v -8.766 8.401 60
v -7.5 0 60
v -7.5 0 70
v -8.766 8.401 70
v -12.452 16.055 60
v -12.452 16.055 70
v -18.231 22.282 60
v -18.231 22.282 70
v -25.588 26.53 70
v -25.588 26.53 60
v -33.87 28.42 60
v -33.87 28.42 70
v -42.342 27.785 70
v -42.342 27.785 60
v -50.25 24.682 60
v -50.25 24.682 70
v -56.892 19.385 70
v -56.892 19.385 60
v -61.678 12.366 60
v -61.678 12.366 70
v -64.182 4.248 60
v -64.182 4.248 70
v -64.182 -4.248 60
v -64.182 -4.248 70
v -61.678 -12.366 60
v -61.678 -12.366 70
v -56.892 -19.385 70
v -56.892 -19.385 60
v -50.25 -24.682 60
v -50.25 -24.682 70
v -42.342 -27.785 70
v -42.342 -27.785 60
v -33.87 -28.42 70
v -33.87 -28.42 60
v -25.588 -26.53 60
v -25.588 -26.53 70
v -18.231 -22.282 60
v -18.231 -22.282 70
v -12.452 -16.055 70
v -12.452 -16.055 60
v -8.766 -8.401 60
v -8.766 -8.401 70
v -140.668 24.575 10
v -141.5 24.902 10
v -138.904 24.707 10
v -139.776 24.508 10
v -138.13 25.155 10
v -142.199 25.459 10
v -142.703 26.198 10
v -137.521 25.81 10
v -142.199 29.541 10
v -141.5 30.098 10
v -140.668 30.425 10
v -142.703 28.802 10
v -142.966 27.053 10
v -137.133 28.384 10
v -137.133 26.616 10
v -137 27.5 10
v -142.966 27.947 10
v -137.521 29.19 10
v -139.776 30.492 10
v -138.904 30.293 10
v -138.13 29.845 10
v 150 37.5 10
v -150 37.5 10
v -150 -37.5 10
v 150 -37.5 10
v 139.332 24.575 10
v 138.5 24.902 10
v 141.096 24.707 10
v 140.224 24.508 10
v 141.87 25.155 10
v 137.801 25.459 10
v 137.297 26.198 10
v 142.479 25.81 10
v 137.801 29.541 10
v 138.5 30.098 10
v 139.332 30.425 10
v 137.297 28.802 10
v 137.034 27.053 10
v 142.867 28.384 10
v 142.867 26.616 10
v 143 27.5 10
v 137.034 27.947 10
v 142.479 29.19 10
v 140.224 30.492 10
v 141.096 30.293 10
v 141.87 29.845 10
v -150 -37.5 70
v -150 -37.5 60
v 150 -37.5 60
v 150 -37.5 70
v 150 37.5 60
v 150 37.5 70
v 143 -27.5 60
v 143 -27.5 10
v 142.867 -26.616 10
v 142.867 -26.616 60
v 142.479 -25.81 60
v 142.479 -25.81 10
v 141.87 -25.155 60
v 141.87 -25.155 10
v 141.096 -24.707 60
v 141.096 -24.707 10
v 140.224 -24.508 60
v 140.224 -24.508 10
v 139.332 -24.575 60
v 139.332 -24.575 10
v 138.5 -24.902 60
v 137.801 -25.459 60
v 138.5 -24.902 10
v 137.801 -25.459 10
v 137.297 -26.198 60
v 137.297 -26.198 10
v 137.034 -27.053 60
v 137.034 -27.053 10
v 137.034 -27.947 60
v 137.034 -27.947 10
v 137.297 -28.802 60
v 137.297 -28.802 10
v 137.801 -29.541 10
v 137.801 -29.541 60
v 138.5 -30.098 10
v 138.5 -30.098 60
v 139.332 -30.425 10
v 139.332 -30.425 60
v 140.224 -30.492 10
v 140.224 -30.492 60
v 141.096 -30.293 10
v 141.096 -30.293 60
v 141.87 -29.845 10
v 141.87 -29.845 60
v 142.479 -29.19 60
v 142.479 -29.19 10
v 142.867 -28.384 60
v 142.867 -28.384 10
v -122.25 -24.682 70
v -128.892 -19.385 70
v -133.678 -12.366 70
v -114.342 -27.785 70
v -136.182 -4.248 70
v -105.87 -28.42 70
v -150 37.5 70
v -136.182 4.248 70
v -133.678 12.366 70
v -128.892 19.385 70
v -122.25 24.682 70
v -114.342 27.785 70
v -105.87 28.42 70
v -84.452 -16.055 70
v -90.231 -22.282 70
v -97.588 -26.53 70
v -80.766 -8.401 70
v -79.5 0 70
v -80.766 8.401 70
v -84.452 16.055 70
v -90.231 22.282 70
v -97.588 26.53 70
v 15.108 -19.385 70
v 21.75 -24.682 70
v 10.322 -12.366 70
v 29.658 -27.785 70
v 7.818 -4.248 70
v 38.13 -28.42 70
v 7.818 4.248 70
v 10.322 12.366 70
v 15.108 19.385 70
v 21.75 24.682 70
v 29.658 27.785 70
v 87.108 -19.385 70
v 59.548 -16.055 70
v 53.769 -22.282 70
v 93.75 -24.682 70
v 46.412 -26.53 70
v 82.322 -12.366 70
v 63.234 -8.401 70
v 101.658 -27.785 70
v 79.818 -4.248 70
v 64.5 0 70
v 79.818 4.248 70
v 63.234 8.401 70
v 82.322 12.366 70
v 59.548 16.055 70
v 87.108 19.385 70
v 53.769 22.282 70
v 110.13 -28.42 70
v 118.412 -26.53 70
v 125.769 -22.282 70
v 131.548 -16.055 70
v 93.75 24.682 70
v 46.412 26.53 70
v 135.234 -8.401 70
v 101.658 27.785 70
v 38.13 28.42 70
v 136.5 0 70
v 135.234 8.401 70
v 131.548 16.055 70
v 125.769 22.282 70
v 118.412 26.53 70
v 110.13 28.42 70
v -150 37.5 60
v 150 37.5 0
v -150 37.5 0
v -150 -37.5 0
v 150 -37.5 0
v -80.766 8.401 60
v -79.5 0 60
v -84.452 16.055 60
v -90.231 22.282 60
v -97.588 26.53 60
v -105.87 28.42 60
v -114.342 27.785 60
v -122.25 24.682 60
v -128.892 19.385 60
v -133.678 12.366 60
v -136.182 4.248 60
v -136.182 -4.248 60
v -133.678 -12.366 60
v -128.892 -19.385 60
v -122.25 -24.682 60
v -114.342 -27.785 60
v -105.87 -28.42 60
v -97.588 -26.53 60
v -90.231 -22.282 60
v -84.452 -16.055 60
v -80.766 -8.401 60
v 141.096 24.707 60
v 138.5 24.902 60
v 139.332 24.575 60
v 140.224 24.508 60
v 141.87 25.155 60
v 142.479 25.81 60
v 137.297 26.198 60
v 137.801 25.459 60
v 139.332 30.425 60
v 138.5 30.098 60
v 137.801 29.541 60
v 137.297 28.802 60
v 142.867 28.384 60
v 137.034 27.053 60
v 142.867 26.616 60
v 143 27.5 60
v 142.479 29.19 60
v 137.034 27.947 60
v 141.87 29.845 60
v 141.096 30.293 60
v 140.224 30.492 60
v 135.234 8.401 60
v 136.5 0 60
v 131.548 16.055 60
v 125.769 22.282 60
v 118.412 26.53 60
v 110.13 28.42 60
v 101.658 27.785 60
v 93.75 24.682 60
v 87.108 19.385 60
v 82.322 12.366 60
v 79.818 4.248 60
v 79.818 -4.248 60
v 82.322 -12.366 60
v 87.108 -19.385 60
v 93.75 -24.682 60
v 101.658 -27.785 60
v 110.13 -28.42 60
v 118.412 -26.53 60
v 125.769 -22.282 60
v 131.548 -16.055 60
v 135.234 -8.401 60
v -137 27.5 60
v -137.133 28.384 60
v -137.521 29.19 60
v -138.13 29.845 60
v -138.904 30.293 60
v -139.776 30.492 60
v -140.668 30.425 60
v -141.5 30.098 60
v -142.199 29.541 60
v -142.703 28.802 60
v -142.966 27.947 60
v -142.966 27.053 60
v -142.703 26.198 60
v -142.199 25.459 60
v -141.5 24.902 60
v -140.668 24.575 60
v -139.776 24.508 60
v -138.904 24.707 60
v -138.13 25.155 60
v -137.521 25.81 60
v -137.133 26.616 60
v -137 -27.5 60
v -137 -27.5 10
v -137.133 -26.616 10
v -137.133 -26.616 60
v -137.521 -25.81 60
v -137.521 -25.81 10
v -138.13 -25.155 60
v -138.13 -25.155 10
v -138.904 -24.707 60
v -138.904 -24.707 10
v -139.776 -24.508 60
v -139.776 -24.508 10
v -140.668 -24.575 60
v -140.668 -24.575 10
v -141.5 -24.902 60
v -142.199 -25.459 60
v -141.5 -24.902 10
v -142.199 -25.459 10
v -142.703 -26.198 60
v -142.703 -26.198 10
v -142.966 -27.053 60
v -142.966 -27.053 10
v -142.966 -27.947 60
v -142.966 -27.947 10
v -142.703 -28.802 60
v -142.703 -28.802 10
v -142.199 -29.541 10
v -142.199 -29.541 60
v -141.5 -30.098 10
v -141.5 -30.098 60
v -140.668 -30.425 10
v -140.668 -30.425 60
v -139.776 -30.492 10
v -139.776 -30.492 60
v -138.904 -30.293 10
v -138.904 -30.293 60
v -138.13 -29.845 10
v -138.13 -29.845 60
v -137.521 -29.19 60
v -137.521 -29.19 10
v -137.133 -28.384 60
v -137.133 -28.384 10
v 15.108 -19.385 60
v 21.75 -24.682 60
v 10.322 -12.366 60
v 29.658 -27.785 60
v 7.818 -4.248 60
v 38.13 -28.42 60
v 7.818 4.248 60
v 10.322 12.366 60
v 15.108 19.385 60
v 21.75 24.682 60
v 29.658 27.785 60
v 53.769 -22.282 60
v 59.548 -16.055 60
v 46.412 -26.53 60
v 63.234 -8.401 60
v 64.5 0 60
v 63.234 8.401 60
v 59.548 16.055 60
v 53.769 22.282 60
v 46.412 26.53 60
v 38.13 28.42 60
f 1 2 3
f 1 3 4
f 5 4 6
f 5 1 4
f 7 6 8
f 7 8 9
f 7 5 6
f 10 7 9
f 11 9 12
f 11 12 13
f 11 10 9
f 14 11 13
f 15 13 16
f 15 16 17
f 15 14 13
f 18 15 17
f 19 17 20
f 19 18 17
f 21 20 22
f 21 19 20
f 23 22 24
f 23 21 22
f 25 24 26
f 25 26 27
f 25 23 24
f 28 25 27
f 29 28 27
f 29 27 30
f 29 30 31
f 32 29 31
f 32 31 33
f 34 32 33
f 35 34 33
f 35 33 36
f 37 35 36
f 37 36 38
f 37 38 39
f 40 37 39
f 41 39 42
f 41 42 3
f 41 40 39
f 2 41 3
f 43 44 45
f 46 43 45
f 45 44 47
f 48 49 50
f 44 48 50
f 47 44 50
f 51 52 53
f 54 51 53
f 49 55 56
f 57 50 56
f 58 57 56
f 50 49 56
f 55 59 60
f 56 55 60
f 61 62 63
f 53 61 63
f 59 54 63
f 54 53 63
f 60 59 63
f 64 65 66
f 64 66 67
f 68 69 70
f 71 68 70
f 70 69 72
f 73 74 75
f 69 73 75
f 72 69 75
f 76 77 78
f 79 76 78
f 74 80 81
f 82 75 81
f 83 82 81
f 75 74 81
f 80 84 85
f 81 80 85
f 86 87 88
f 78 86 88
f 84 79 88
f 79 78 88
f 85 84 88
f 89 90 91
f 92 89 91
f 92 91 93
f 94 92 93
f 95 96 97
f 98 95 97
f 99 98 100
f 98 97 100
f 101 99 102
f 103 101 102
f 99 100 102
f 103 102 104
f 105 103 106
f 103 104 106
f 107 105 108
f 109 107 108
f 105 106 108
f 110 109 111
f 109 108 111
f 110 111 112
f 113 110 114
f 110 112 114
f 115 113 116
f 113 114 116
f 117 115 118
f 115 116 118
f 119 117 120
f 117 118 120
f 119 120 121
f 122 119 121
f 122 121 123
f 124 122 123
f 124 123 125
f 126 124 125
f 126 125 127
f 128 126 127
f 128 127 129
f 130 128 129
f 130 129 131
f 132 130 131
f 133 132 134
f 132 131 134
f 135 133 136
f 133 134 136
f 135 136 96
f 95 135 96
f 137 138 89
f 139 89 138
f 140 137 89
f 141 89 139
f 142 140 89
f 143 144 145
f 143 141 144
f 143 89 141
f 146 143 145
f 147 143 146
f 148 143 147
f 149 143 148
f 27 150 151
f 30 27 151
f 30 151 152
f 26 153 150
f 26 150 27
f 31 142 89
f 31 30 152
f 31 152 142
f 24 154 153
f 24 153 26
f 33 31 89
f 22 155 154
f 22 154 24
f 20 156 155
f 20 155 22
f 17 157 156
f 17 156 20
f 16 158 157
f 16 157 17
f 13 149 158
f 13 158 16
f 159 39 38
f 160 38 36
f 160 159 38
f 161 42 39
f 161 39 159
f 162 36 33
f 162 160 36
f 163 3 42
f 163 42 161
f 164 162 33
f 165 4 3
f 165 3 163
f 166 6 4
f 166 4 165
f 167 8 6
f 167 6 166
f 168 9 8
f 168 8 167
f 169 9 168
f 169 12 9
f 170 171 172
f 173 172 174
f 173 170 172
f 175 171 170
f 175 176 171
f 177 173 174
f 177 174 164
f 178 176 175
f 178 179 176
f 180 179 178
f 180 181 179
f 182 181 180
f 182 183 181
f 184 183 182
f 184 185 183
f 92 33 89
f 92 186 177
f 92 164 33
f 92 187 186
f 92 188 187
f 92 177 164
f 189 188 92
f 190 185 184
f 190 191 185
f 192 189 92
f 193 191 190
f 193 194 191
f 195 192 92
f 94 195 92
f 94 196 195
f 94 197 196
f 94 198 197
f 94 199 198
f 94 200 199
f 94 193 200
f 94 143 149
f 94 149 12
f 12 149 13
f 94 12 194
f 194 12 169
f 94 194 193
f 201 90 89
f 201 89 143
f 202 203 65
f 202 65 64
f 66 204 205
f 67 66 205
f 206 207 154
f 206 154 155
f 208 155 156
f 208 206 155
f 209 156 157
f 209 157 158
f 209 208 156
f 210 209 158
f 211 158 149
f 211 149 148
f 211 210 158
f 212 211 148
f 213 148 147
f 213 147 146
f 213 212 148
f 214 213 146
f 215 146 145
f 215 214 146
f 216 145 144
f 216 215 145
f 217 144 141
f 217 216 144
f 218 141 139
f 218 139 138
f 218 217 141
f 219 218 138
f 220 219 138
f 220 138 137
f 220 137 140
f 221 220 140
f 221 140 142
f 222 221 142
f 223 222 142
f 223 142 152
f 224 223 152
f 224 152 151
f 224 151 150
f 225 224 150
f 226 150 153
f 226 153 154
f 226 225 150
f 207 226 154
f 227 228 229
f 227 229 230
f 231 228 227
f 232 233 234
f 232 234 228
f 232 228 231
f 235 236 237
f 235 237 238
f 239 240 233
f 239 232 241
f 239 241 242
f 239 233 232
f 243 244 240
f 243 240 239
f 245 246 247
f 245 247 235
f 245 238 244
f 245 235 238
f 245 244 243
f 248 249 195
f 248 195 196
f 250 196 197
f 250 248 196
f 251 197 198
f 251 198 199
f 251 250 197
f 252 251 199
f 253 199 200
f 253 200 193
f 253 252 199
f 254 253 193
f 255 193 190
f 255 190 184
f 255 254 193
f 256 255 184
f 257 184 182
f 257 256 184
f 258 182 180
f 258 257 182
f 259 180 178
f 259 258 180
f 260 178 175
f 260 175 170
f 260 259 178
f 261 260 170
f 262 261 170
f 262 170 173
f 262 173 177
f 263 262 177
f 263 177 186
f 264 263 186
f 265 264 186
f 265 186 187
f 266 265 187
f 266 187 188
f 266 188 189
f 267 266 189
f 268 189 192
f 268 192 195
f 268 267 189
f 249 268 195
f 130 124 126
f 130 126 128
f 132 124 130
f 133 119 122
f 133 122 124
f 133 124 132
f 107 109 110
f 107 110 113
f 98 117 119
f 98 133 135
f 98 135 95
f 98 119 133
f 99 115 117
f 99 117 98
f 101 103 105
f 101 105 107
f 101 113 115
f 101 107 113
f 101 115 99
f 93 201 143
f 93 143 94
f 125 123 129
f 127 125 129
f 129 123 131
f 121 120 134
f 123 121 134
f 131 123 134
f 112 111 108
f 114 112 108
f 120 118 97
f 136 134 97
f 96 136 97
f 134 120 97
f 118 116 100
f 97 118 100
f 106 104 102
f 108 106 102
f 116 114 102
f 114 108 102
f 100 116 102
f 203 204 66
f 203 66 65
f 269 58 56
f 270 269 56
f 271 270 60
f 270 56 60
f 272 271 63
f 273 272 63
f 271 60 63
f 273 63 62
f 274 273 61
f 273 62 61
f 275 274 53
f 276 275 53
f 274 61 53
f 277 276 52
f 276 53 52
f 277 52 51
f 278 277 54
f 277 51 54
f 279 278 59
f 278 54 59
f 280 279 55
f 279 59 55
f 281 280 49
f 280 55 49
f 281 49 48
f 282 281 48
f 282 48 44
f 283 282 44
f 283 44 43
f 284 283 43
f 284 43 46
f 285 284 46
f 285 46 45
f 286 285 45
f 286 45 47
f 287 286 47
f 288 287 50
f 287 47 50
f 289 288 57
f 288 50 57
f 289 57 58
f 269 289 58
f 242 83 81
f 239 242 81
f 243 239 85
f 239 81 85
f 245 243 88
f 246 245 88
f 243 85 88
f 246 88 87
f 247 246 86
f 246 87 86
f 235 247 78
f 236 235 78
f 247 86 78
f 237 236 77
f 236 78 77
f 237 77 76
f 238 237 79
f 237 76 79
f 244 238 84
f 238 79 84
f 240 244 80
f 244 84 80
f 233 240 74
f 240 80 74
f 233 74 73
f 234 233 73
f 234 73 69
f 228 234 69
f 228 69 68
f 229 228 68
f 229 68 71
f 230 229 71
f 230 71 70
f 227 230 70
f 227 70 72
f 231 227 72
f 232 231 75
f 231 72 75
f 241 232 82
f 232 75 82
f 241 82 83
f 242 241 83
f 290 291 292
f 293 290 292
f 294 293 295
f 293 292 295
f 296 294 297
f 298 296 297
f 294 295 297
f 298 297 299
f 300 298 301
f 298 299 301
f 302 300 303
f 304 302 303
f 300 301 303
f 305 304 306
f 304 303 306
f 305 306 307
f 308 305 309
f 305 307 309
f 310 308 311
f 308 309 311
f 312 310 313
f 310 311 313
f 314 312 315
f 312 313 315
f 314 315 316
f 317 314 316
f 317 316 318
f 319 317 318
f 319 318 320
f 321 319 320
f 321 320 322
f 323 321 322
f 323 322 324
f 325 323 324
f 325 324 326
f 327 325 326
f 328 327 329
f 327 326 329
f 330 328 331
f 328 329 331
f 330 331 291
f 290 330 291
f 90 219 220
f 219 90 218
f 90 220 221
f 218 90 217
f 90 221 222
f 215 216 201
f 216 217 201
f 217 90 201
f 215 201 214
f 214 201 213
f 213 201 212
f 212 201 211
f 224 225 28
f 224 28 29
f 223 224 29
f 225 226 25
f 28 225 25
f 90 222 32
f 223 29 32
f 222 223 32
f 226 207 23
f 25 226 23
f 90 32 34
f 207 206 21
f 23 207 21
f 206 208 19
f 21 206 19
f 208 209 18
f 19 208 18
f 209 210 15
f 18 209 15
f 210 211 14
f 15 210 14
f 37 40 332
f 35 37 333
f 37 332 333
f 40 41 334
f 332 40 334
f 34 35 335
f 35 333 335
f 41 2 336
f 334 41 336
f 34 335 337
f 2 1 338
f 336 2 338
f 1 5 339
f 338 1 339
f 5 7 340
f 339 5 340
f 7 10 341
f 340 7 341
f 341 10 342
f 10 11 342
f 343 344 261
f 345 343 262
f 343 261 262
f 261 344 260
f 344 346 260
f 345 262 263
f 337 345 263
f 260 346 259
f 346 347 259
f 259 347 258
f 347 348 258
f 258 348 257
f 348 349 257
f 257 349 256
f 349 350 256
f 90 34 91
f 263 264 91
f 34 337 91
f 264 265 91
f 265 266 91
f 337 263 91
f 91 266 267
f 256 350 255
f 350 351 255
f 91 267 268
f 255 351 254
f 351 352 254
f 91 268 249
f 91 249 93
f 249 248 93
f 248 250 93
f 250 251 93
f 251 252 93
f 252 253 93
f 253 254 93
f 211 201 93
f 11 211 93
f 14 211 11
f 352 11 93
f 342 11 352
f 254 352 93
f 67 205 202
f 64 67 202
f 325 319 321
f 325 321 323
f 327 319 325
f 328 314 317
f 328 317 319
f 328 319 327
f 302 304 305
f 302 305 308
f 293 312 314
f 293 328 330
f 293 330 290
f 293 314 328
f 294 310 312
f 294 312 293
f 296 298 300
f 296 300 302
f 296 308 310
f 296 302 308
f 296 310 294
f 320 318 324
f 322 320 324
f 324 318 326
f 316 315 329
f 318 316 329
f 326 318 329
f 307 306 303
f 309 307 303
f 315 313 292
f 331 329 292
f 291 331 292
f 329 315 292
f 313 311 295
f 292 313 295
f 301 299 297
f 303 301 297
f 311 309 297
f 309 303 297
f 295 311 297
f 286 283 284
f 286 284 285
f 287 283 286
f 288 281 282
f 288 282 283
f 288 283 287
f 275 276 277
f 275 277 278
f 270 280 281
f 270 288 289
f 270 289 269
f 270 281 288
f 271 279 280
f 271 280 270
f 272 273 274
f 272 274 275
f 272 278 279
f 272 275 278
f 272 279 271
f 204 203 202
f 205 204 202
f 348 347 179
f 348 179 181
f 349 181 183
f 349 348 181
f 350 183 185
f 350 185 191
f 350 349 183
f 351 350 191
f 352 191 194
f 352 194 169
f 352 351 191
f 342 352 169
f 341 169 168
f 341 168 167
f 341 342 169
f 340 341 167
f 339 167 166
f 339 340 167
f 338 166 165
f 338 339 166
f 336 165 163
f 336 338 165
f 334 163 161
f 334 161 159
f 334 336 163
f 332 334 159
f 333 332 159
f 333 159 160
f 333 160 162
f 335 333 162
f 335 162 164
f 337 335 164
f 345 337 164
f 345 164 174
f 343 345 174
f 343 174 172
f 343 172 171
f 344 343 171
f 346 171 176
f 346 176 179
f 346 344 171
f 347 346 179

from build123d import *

# Parameters (mm, degrees)
F0_W     = 300
F0_H     = 75
F1_DEPTH = 10
F3_W     = 300
F3_H     = 75
F3_R     = 28.5
F4_DEPTH = 10
F5_R     = 3
F6_DEPTH = 50


with BuildPart() as f1:
    # F0 (on Top) → F1 (new body)
    with BuildSketch(Plane.XY):
        Rectangle(F0_W, F0_H)
    extrude(amount=F1_DEPTH)


with BuildPart() as f4:
    # F3 (on offset) → F4 (new body)
    with BuildSketch(Plane.XY.offset(60)):
        Rectangle(F3_W, F3_H)
        with Locations((-108, 0)):
            Circle(F3_R, mode=Mode.SUBTRACT)
        with Locations((-36, 0)):
            Circle(F3_R, mode=Mode.SUBTRACT)
        with Locations((36, 0)):
            Circle(F3_R, mode=Mode.SUBTRACT)
        with Locations((108, 0)):
            Circle(F3_R, mode=Mode.SUBTRACT)
    extrude(amount=F4_DEPTH)


with BuildPart() as f6:
    # F5 (on face) → F6 (new body, through all)
    with BuildSketch(Plane.XY.offset(10)):
        with Locations((-140, -27.5)):
            Circle(F5_R)
        with Locations((-140, 27.5)):
            Circle(F5_R)
        with Locations((140, 27.5)):
            Circle(F5_R)
        with Locations((140, -27.5)):
            Circle(F5_R)
    extrude(amount=F6_DEPTH)


solid = Compound([f1.part, f4.part, f6.part])
